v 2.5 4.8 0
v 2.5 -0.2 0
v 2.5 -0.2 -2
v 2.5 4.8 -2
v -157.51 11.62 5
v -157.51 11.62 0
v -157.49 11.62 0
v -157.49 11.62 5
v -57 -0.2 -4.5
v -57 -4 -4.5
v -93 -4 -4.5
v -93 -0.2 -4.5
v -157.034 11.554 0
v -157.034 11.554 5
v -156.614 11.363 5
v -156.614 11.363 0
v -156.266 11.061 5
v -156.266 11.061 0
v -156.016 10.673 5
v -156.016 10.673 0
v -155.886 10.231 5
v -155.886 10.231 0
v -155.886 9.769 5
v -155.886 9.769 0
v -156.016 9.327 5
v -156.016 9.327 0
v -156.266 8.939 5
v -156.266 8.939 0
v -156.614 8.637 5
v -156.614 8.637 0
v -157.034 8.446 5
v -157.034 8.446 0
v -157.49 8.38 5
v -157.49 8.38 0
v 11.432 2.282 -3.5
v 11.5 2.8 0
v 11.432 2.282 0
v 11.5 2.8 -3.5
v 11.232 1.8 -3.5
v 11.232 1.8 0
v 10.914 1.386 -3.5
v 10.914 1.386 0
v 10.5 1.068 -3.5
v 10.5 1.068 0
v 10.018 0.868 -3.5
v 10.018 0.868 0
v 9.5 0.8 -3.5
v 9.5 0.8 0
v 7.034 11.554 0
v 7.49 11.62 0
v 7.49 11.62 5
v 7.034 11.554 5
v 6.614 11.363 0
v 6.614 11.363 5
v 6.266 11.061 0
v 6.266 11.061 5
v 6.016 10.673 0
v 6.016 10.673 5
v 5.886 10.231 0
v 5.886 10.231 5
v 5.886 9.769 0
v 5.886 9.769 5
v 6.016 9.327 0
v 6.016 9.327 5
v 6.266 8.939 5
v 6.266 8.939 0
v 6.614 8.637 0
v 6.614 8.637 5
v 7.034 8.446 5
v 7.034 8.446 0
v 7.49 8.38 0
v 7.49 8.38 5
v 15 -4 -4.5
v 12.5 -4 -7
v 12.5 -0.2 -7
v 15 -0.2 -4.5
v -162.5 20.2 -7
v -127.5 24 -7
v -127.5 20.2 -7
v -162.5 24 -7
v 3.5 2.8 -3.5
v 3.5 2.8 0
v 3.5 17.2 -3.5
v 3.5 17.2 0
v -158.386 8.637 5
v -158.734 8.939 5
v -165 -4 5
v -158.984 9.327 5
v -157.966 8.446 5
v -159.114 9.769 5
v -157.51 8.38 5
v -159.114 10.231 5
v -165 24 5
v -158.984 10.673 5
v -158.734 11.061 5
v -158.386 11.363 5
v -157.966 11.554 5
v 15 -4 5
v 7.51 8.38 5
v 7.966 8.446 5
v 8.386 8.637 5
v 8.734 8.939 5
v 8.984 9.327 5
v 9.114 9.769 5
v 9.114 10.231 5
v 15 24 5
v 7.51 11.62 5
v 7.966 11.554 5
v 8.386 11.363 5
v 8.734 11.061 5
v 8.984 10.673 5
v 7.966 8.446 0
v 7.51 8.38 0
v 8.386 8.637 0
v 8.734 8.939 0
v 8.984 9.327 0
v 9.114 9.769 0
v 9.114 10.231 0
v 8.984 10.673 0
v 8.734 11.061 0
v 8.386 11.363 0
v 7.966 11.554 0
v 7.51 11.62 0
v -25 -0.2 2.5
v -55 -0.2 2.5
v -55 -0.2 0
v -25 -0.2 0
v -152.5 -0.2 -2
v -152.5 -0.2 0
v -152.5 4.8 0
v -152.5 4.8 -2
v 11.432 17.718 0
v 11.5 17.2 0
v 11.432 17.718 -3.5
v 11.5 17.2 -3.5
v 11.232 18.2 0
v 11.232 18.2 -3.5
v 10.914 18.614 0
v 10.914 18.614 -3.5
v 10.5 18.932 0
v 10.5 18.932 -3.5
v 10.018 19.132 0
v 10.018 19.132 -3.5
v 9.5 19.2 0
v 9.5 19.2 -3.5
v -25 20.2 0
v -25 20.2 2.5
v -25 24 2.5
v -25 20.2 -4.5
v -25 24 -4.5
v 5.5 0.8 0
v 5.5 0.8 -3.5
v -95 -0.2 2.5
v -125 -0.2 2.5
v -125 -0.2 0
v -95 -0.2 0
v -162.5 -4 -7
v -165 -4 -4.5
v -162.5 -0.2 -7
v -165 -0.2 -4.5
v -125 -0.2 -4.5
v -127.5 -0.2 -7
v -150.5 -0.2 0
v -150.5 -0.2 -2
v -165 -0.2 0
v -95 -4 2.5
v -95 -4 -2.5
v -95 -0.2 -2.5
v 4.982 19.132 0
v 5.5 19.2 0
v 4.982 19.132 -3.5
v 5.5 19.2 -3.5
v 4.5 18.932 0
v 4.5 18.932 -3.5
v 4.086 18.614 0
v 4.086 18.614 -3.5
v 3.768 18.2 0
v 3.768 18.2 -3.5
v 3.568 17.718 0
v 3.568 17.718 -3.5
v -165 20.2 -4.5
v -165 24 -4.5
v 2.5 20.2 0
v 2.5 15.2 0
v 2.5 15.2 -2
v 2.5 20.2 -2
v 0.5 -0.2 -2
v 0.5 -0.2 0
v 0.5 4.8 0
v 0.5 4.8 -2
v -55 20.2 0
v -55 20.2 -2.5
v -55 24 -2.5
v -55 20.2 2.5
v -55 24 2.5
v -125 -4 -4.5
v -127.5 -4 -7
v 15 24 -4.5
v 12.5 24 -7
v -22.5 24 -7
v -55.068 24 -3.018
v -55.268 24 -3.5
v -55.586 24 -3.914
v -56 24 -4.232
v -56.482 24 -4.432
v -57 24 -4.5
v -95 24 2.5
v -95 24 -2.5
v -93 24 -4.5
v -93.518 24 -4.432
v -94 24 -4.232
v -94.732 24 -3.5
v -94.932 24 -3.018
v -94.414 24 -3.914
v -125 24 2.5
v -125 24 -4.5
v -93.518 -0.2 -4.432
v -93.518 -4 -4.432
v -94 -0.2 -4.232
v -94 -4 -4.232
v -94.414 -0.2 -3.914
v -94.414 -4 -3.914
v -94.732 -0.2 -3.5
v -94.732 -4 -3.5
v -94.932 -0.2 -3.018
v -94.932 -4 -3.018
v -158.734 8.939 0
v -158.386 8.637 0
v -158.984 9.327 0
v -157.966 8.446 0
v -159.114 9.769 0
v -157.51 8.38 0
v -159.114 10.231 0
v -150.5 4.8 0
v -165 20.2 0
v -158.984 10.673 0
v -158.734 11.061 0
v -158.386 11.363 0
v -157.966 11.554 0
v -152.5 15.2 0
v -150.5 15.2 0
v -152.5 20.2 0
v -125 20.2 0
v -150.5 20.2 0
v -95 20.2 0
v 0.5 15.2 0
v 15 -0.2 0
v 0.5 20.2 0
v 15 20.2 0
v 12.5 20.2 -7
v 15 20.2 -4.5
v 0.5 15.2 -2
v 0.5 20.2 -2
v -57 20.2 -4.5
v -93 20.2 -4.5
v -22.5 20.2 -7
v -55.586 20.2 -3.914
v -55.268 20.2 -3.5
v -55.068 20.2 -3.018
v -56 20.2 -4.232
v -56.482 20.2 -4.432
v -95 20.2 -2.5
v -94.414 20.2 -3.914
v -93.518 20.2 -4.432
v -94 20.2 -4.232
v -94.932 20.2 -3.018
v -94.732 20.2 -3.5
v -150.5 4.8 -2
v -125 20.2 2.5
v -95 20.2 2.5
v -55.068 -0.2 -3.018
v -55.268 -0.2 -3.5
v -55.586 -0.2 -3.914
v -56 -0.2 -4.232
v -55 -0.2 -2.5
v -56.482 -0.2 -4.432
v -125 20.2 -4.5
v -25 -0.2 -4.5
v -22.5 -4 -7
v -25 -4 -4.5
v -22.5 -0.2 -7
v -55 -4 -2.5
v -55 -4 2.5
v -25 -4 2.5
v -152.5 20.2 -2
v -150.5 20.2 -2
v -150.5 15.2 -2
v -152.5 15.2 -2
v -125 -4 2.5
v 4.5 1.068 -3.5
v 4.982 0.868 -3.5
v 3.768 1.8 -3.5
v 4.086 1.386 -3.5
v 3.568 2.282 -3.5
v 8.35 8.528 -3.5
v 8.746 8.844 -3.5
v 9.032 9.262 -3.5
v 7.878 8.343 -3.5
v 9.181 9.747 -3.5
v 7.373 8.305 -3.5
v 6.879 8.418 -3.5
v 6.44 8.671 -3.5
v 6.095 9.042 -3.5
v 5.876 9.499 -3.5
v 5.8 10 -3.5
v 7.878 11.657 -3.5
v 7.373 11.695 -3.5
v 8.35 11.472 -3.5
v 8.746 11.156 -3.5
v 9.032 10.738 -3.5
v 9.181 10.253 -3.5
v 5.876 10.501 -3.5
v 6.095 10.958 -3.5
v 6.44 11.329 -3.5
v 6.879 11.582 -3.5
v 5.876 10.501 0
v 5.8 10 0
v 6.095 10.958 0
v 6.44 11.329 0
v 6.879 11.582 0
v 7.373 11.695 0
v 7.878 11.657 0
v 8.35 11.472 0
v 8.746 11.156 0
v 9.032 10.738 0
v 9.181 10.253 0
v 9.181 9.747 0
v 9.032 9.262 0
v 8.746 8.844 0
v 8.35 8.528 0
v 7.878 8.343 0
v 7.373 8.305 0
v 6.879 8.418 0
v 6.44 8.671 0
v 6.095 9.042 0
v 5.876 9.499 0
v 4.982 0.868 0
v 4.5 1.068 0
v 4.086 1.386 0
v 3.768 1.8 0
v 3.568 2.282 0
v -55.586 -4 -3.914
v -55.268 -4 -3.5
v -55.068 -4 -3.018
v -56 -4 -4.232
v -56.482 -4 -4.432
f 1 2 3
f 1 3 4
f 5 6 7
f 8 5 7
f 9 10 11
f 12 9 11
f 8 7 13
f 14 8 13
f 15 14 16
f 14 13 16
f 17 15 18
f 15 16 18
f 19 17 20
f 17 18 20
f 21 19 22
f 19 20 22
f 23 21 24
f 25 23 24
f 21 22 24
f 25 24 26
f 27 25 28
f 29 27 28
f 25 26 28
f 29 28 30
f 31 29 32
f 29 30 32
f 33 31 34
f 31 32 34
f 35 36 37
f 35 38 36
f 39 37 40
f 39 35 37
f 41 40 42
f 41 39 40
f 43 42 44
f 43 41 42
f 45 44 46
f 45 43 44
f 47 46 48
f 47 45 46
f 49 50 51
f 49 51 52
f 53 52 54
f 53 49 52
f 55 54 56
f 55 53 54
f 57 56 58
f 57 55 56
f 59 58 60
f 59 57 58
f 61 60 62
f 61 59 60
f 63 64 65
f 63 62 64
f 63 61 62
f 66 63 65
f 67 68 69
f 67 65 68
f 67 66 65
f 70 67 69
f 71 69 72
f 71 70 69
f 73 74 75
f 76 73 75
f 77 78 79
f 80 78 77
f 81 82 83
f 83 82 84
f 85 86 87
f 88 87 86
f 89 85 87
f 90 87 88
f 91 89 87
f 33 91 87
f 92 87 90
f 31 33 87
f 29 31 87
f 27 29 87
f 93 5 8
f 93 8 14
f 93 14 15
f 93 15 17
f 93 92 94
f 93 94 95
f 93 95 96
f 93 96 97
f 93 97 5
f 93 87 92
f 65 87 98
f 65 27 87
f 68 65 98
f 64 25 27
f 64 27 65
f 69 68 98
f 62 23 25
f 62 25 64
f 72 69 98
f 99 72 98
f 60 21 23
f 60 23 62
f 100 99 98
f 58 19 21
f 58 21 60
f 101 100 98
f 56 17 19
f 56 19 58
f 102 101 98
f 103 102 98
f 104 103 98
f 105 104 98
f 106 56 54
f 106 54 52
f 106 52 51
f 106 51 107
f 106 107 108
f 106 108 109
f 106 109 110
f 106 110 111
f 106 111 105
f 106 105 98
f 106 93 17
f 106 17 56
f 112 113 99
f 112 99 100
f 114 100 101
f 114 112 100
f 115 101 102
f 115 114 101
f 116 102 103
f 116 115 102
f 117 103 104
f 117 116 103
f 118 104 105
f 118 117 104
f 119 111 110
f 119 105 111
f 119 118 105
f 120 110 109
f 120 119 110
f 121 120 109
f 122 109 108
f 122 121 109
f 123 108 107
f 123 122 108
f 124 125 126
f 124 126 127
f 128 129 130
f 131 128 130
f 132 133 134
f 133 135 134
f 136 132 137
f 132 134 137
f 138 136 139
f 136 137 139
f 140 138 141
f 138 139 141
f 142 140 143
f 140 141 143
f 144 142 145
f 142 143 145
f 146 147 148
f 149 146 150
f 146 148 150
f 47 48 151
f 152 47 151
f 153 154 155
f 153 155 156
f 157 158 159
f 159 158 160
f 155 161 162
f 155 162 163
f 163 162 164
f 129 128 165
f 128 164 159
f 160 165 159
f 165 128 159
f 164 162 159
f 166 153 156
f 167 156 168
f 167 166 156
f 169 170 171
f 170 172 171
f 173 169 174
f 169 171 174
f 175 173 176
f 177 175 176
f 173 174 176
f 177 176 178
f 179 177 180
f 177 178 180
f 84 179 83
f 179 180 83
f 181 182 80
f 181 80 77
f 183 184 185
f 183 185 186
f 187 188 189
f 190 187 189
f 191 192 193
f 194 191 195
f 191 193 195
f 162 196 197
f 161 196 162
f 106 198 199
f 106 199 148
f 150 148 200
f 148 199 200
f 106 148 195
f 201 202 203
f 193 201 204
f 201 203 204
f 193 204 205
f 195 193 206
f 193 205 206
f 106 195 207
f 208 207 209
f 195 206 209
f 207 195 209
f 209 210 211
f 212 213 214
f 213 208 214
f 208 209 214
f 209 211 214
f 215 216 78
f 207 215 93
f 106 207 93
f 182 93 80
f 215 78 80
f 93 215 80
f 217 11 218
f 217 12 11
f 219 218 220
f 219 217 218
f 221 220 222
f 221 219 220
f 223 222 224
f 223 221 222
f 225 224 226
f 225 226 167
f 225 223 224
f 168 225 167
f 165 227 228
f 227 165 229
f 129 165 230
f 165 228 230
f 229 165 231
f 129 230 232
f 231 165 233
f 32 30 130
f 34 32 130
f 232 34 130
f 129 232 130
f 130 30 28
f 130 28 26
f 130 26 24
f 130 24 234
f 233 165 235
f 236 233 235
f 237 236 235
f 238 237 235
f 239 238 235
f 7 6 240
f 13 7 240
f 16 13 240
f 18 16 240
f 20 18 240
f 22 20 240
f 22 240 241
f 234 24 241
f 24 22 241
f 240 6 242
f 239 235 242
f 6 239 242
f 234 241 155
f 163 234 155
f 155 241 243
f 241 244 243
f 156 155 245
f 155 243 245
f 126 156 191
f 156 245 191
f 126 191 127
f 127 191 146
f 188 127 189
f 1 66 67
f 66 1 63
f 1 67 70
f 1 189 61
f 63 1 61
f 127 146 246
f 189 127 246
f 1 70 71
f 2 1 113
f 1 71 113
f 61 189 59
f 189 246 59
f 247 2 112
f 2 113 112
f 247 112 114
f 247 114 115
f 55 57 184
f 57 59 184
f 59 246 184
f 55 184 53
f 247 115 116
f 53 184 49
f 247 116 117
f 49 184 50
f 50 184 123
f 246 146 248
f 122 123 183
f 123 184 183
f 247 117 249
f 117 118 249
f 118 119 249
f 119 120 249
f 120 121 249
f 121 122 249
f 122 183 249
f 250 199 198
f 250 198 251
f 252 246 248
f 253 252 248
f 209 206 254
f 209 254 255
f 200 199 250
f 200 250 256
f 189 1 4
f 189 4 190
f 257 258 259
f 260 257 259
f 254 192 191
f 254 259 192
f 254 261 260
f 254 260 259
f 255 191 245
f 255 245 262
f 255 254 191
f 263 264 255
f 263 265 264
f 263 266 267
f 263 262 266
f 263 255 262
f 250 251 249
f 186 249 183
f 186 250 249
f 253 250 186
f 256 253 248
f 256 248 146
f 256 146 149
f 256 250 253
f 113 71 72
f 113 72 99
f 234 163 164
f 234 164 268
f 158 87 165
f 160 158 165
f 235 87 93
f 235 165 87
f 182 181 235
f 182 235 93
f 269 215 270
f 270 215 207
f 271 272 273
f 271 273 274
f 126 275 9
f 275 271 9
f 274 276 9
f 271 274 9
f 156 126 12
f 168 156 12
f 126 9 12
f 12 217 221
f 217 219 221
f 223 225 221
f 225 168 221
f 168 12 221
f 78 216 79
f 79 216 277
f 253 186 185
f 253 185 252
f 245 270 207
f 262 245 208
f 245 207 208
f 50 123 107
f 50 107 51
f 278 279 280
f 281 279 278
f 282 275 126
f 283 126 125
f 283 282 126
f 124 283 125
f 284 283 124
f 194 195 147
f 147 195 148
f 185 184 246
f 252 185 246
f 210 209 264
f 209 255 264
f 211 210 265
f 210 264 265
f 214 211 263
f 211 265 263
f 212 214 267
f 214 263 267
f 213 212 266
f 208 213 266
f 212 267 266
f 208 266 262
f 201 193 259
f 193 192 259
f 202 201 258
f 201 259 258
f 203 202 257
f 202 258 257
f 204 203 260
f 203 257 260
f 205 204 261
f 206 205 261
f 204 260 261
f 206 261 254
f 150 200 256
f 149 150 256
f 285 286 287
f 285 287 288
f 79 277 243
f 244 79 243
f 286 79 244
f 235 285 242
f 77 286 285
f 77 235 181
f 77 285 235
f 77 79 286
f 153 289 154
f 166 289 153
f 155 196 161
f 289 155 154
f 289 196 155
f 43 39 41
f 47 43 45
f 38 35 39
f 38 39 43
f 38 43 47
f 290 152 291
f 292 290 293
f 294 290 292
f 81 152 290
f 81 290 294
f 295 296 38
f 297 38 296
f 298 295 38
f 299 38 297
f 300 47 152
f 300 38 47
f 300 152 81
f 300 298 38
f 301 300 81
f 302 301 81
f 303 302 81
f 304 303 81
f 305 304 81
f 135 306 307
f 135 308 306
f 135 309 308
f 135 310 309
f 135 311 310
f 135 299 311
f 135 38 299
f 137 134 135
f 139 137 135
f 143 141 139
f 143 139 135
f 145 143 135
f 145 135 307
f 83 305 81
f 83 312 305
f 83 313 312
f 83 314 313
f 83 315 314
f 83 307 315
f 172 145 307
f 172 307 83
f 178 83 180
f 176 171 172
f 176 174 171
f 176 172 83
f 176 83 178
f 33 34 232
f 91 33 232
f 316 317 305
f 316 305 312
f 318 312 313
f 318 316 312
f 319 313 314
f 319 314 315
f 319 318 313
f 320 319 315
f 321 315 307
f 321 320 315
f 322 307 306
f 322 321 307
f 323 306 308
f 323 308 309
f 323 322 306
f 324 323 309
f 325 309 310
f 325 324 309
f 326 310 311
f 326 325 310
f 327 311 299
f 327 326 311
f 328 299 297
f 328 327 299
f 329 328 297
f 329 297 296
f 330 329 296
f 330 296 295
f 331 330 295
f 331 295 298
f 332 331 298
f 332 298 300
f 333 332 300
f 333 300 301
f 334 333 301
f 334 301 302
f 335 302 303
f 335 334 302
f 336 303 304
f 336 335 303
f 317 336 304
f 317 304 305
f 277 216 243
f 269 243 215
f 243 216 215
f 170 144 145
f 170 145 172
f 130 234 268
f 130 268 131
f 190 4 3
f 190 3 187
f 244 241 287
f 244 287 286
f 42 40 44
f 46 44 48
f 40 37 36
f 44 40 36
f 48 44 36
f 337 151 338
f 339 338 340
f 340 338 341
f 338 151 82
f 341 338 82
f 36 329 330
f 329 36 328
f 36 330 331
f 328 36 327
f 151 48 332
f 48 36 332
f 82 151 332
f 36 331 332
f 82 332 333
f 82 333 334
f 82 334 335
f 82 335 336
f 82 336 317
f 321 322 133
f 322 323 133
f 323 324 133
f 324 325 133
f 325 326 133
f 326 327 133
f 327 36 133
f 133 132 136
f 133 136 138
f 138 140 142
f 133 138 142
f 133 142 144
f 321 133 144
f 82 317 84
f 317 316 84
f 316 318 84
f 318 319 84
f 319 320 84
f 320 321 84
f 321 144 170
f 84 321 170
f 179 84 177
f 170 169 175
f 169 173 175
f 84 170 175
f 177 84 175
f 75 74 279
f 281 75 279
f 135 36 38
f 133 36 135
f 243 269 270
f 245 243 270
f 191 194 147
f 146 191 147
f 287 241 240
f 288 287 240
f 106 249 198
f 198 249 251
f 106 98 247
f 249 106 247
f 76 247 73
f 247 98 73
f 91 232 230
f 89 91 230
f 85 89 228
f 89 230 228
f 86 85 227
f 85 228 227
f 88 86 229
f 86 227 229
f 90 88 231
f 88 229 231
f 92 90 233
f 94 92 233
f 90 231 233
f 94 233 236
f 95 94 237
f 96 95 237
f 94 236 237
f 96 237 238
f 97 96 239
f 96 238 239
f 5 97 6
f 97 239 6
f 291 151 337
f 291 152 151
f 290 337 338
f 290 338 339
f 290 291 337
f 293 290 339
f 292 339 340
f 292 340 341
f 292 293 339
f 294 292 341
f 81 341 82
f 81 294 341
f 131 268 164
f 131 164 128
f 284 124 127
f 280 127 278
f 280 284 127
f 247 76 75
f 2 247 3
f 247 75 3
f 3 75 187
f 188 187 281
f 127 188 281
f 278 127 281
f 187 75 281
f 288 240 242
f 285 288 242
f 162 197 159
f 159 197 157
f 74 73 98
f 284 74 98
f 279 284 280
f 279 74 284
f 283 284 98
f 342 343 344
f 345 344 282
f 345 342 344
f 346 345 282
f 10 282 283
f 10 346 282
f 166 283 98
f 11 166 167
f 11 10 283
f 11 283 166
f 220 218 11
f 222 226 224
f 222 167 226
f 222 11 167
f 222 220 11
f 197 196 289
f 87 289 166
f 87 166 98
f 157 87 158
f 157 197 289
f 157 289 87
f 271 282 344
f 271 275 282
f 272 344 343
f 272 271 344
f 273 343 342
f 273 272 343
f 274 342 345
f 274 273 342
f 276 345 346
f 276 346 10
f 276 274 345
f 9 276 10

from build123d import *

# Parameters (mm, degrees)
SKETCH1_W           = 180
SKETCH1_H           = 28
BOSS_EXTRUDE1_DEPTH = 5
SKETCH2_W           = 40
SKETCH2_H           = 7
SKETCH2_H_2         = 4.5
BOSS_EXTRUDE2_DEPTH = 3.8
CHAMFER1_SIZE       = 2.5
FILLET1_R           = 2
SKETCH3_W           = 2
SKETCH3_H           = 5
BOSS_EXTRUDE3_DEPTH = 2
CUT_EXTRUDE1_DEPTH  = 167.883192683
SKETCH5_W           = 30
SKETCH5_H           = 2.5
CUT_EXTRUDE2_DEPTH  = 3.8
CUT_EXTRUDE3_START  = -28
SKETCH5_2_W         = 30
SKETCH5_2_H         = 2.5
CUT_EXTRUDE3_DEPTH  = 3.8
SKETCH7_W           = 8
SKETCH7_H           = 18.4
SKETCH7_R           = 1.7
BOSS_EXTRUDE4_DEPTH = 3.5
FILLET2_R           = 2


with BuildPart() as part:
    # Sketch1 → Boss-Extrude1 (new body)
    with BuildSketch(Plane.XY):
        with Locations((-75, 10)):
            Rectangle(SKETCH1_W, SKETCH1_H)
    extrude(amount=BOSS_EXTRUDE1_DEPTH)

    # Sketch2 → Boss-Extrude2 (add)
    with BuildSketch(Plane(origin=(0, -4, 0), x_dir=(-1, 0, 0), z_dir=(0, -1, 0))):
        with Locations((5, 3.5)):
            Rectangle(SKETCH2_W, SKETCH2_H)
        with Locations((75, 2.25)):
            Rectangle(SKETCH2_W, SKETCH2_H_2)
        with Locations((145, 3.5)):
            Rectangle(SKETCH2_W, SKETCH2_H)
    extrude(amount=-BOSS_EXTRUDE2_DEPTH)

    # Chamfer1
    chamfer1_edges = [part.edges().sort_by_distance(p)[0] for p in [
        (-25, -2.1, -7),
        (15, -2.1, -7),
        (-125, -2.1, -7),
        (-165, -2.1, -7),
    ]]
    chamfer(chamfer1_edges, length=CHAMFER1_SIZE)

    # Fillet1
    fillet1_edges = [part.edges().sort_by_distance(p)[0] for p in [
        (-95, -2.1, -4.5),
        (-55, -2.1, -4.5),
    ]]
    fillet(fillet1_edges, radius=FILLET1_R)

    # Mirror1: part across plane


with BuildPart() as part_1:
    add(part.part)
    add(part.part.mirror(Plane.ZX.offset(10)))

    # Sketch3 → Boss-Extrude3 (add)
    with BuildSketch(Plane(origin=(0, 0, 0), x_dir=(-1, 0, 0), z_dir=(0, 0, -1))):
        with Locations((-1.5, 17.7)):
            Rectangle(SKETCH3_W, SKETCH3_H)
        with Locations((-1.5, 2.3)):
            Rectangle(SKETCH3_W, SKETCH3_H)
        with Locations((151.5, 17.7)):
            Rectangle(SKETCH3_W, SKETCH3_H)
        with Locations((151.5, 2.3)):
            Rectangle(SKETCH3_W, SKETCH3_H)
    extrude(amount=BOSS_EXTRUDE3_DEPTH)

    # Sketch4 → Cut-Extrude1 (cut, through all)
    with BuildSketch(Plane(origin=(0, 0, 0), x_dir=(-1, 0, 0), z_dir=(0, 0, -1))):
        with BuildLine():
            Line((-7.51, 11.62), (-7.49, 11.62))
            ThreePointArc((-7.49, 11.62), (-5.87, 10), (-7.49, 8.38))
            Line((-7.49, 8.38), (-7.51, 8.38))
            ThreePointArc((-7.51, 8.38), (-9.13, 10), (-7.51, 11.62))
        make_face()
        with BuildLine():
            Line((157.51, 11.62), (157.49, 11.62))
            ThreePointArc((157.49, 11.62), (155.87, 10), (157.49, 8.38))
            Line((157.49, 8.38), (157.51, 8.38))
            ThreePointArc((157.51, 8.38), (159.13, 10), (157.51, 11.62))
        make_face()
    extrude(amount=-CUT_EXTRUDE1_DEPTH, mode=Mode.SUBTRACT)

    # Sketch5 → Cut-Extrude2 (cut)
    with BuildSketch(Plane.XZ.offset(4)):
        with Locations((-40, 1.25)):
            Rectangle(SKETCH5_W, SKETCH5_H)
        with Locations((-110, 1.25)):
            Rectangle(SKETCH5_W, SKETCH5_H)
    extrude(amount=-CUT_EXTRUDE2_DEPTH, mode=Mode.SUBTRACT)

    # Sketch5<2> → Cut-Extrude3 (cut)
    with BuildSketch(Plane.XZ.offset(4).offset(CUT_EXTRUDE3_START)):
        with Locations((-40, 1.25)):
            Rectangle(SKETCH5_2_W, SKETCH5_2_H)
        with Locations((-110, 1.25)):
            Rectangle(SKETCH5_2_W, SKETCH5_2_H)
    extrude(amount=CUT_EXTRUDE3_DEPTH, mode=Mode.SUBTRACT)


with BuildPart() as body_2:
    # Sketch7 → Boss-Extrude4 (new body)
    with BuildSketch(Plane(origin=(0, 0, 0), x_dir=(-1, 0, 0), z_dir=(0, 0, -1))):
        with Locations((-7.5, 10)):
            Rectangle(SKETCH7_W, SKETCH7_H)
        with Locations((-7.5, 10)):
            Circle(SKETCH7_R, mode=Mode.SUBTRACT)
    extrude(amount=BOSS_EXTRUDE4_DEPTH)

    # Fillet2
    fillet2_edges = [body_2.edges().sort_by_distance(p)[0] for p in [
        (3.5, 0.8, -1.75),
        (11.5, 0.8, -1.75),
        (11.5, 19.2, -1.75),
        (3.5, 19.2, -1.75),
    ]]
    fillet(fillet2_edges, radius=FILLET2_R)


solid = Compound([part_1.part, body_2.part])
